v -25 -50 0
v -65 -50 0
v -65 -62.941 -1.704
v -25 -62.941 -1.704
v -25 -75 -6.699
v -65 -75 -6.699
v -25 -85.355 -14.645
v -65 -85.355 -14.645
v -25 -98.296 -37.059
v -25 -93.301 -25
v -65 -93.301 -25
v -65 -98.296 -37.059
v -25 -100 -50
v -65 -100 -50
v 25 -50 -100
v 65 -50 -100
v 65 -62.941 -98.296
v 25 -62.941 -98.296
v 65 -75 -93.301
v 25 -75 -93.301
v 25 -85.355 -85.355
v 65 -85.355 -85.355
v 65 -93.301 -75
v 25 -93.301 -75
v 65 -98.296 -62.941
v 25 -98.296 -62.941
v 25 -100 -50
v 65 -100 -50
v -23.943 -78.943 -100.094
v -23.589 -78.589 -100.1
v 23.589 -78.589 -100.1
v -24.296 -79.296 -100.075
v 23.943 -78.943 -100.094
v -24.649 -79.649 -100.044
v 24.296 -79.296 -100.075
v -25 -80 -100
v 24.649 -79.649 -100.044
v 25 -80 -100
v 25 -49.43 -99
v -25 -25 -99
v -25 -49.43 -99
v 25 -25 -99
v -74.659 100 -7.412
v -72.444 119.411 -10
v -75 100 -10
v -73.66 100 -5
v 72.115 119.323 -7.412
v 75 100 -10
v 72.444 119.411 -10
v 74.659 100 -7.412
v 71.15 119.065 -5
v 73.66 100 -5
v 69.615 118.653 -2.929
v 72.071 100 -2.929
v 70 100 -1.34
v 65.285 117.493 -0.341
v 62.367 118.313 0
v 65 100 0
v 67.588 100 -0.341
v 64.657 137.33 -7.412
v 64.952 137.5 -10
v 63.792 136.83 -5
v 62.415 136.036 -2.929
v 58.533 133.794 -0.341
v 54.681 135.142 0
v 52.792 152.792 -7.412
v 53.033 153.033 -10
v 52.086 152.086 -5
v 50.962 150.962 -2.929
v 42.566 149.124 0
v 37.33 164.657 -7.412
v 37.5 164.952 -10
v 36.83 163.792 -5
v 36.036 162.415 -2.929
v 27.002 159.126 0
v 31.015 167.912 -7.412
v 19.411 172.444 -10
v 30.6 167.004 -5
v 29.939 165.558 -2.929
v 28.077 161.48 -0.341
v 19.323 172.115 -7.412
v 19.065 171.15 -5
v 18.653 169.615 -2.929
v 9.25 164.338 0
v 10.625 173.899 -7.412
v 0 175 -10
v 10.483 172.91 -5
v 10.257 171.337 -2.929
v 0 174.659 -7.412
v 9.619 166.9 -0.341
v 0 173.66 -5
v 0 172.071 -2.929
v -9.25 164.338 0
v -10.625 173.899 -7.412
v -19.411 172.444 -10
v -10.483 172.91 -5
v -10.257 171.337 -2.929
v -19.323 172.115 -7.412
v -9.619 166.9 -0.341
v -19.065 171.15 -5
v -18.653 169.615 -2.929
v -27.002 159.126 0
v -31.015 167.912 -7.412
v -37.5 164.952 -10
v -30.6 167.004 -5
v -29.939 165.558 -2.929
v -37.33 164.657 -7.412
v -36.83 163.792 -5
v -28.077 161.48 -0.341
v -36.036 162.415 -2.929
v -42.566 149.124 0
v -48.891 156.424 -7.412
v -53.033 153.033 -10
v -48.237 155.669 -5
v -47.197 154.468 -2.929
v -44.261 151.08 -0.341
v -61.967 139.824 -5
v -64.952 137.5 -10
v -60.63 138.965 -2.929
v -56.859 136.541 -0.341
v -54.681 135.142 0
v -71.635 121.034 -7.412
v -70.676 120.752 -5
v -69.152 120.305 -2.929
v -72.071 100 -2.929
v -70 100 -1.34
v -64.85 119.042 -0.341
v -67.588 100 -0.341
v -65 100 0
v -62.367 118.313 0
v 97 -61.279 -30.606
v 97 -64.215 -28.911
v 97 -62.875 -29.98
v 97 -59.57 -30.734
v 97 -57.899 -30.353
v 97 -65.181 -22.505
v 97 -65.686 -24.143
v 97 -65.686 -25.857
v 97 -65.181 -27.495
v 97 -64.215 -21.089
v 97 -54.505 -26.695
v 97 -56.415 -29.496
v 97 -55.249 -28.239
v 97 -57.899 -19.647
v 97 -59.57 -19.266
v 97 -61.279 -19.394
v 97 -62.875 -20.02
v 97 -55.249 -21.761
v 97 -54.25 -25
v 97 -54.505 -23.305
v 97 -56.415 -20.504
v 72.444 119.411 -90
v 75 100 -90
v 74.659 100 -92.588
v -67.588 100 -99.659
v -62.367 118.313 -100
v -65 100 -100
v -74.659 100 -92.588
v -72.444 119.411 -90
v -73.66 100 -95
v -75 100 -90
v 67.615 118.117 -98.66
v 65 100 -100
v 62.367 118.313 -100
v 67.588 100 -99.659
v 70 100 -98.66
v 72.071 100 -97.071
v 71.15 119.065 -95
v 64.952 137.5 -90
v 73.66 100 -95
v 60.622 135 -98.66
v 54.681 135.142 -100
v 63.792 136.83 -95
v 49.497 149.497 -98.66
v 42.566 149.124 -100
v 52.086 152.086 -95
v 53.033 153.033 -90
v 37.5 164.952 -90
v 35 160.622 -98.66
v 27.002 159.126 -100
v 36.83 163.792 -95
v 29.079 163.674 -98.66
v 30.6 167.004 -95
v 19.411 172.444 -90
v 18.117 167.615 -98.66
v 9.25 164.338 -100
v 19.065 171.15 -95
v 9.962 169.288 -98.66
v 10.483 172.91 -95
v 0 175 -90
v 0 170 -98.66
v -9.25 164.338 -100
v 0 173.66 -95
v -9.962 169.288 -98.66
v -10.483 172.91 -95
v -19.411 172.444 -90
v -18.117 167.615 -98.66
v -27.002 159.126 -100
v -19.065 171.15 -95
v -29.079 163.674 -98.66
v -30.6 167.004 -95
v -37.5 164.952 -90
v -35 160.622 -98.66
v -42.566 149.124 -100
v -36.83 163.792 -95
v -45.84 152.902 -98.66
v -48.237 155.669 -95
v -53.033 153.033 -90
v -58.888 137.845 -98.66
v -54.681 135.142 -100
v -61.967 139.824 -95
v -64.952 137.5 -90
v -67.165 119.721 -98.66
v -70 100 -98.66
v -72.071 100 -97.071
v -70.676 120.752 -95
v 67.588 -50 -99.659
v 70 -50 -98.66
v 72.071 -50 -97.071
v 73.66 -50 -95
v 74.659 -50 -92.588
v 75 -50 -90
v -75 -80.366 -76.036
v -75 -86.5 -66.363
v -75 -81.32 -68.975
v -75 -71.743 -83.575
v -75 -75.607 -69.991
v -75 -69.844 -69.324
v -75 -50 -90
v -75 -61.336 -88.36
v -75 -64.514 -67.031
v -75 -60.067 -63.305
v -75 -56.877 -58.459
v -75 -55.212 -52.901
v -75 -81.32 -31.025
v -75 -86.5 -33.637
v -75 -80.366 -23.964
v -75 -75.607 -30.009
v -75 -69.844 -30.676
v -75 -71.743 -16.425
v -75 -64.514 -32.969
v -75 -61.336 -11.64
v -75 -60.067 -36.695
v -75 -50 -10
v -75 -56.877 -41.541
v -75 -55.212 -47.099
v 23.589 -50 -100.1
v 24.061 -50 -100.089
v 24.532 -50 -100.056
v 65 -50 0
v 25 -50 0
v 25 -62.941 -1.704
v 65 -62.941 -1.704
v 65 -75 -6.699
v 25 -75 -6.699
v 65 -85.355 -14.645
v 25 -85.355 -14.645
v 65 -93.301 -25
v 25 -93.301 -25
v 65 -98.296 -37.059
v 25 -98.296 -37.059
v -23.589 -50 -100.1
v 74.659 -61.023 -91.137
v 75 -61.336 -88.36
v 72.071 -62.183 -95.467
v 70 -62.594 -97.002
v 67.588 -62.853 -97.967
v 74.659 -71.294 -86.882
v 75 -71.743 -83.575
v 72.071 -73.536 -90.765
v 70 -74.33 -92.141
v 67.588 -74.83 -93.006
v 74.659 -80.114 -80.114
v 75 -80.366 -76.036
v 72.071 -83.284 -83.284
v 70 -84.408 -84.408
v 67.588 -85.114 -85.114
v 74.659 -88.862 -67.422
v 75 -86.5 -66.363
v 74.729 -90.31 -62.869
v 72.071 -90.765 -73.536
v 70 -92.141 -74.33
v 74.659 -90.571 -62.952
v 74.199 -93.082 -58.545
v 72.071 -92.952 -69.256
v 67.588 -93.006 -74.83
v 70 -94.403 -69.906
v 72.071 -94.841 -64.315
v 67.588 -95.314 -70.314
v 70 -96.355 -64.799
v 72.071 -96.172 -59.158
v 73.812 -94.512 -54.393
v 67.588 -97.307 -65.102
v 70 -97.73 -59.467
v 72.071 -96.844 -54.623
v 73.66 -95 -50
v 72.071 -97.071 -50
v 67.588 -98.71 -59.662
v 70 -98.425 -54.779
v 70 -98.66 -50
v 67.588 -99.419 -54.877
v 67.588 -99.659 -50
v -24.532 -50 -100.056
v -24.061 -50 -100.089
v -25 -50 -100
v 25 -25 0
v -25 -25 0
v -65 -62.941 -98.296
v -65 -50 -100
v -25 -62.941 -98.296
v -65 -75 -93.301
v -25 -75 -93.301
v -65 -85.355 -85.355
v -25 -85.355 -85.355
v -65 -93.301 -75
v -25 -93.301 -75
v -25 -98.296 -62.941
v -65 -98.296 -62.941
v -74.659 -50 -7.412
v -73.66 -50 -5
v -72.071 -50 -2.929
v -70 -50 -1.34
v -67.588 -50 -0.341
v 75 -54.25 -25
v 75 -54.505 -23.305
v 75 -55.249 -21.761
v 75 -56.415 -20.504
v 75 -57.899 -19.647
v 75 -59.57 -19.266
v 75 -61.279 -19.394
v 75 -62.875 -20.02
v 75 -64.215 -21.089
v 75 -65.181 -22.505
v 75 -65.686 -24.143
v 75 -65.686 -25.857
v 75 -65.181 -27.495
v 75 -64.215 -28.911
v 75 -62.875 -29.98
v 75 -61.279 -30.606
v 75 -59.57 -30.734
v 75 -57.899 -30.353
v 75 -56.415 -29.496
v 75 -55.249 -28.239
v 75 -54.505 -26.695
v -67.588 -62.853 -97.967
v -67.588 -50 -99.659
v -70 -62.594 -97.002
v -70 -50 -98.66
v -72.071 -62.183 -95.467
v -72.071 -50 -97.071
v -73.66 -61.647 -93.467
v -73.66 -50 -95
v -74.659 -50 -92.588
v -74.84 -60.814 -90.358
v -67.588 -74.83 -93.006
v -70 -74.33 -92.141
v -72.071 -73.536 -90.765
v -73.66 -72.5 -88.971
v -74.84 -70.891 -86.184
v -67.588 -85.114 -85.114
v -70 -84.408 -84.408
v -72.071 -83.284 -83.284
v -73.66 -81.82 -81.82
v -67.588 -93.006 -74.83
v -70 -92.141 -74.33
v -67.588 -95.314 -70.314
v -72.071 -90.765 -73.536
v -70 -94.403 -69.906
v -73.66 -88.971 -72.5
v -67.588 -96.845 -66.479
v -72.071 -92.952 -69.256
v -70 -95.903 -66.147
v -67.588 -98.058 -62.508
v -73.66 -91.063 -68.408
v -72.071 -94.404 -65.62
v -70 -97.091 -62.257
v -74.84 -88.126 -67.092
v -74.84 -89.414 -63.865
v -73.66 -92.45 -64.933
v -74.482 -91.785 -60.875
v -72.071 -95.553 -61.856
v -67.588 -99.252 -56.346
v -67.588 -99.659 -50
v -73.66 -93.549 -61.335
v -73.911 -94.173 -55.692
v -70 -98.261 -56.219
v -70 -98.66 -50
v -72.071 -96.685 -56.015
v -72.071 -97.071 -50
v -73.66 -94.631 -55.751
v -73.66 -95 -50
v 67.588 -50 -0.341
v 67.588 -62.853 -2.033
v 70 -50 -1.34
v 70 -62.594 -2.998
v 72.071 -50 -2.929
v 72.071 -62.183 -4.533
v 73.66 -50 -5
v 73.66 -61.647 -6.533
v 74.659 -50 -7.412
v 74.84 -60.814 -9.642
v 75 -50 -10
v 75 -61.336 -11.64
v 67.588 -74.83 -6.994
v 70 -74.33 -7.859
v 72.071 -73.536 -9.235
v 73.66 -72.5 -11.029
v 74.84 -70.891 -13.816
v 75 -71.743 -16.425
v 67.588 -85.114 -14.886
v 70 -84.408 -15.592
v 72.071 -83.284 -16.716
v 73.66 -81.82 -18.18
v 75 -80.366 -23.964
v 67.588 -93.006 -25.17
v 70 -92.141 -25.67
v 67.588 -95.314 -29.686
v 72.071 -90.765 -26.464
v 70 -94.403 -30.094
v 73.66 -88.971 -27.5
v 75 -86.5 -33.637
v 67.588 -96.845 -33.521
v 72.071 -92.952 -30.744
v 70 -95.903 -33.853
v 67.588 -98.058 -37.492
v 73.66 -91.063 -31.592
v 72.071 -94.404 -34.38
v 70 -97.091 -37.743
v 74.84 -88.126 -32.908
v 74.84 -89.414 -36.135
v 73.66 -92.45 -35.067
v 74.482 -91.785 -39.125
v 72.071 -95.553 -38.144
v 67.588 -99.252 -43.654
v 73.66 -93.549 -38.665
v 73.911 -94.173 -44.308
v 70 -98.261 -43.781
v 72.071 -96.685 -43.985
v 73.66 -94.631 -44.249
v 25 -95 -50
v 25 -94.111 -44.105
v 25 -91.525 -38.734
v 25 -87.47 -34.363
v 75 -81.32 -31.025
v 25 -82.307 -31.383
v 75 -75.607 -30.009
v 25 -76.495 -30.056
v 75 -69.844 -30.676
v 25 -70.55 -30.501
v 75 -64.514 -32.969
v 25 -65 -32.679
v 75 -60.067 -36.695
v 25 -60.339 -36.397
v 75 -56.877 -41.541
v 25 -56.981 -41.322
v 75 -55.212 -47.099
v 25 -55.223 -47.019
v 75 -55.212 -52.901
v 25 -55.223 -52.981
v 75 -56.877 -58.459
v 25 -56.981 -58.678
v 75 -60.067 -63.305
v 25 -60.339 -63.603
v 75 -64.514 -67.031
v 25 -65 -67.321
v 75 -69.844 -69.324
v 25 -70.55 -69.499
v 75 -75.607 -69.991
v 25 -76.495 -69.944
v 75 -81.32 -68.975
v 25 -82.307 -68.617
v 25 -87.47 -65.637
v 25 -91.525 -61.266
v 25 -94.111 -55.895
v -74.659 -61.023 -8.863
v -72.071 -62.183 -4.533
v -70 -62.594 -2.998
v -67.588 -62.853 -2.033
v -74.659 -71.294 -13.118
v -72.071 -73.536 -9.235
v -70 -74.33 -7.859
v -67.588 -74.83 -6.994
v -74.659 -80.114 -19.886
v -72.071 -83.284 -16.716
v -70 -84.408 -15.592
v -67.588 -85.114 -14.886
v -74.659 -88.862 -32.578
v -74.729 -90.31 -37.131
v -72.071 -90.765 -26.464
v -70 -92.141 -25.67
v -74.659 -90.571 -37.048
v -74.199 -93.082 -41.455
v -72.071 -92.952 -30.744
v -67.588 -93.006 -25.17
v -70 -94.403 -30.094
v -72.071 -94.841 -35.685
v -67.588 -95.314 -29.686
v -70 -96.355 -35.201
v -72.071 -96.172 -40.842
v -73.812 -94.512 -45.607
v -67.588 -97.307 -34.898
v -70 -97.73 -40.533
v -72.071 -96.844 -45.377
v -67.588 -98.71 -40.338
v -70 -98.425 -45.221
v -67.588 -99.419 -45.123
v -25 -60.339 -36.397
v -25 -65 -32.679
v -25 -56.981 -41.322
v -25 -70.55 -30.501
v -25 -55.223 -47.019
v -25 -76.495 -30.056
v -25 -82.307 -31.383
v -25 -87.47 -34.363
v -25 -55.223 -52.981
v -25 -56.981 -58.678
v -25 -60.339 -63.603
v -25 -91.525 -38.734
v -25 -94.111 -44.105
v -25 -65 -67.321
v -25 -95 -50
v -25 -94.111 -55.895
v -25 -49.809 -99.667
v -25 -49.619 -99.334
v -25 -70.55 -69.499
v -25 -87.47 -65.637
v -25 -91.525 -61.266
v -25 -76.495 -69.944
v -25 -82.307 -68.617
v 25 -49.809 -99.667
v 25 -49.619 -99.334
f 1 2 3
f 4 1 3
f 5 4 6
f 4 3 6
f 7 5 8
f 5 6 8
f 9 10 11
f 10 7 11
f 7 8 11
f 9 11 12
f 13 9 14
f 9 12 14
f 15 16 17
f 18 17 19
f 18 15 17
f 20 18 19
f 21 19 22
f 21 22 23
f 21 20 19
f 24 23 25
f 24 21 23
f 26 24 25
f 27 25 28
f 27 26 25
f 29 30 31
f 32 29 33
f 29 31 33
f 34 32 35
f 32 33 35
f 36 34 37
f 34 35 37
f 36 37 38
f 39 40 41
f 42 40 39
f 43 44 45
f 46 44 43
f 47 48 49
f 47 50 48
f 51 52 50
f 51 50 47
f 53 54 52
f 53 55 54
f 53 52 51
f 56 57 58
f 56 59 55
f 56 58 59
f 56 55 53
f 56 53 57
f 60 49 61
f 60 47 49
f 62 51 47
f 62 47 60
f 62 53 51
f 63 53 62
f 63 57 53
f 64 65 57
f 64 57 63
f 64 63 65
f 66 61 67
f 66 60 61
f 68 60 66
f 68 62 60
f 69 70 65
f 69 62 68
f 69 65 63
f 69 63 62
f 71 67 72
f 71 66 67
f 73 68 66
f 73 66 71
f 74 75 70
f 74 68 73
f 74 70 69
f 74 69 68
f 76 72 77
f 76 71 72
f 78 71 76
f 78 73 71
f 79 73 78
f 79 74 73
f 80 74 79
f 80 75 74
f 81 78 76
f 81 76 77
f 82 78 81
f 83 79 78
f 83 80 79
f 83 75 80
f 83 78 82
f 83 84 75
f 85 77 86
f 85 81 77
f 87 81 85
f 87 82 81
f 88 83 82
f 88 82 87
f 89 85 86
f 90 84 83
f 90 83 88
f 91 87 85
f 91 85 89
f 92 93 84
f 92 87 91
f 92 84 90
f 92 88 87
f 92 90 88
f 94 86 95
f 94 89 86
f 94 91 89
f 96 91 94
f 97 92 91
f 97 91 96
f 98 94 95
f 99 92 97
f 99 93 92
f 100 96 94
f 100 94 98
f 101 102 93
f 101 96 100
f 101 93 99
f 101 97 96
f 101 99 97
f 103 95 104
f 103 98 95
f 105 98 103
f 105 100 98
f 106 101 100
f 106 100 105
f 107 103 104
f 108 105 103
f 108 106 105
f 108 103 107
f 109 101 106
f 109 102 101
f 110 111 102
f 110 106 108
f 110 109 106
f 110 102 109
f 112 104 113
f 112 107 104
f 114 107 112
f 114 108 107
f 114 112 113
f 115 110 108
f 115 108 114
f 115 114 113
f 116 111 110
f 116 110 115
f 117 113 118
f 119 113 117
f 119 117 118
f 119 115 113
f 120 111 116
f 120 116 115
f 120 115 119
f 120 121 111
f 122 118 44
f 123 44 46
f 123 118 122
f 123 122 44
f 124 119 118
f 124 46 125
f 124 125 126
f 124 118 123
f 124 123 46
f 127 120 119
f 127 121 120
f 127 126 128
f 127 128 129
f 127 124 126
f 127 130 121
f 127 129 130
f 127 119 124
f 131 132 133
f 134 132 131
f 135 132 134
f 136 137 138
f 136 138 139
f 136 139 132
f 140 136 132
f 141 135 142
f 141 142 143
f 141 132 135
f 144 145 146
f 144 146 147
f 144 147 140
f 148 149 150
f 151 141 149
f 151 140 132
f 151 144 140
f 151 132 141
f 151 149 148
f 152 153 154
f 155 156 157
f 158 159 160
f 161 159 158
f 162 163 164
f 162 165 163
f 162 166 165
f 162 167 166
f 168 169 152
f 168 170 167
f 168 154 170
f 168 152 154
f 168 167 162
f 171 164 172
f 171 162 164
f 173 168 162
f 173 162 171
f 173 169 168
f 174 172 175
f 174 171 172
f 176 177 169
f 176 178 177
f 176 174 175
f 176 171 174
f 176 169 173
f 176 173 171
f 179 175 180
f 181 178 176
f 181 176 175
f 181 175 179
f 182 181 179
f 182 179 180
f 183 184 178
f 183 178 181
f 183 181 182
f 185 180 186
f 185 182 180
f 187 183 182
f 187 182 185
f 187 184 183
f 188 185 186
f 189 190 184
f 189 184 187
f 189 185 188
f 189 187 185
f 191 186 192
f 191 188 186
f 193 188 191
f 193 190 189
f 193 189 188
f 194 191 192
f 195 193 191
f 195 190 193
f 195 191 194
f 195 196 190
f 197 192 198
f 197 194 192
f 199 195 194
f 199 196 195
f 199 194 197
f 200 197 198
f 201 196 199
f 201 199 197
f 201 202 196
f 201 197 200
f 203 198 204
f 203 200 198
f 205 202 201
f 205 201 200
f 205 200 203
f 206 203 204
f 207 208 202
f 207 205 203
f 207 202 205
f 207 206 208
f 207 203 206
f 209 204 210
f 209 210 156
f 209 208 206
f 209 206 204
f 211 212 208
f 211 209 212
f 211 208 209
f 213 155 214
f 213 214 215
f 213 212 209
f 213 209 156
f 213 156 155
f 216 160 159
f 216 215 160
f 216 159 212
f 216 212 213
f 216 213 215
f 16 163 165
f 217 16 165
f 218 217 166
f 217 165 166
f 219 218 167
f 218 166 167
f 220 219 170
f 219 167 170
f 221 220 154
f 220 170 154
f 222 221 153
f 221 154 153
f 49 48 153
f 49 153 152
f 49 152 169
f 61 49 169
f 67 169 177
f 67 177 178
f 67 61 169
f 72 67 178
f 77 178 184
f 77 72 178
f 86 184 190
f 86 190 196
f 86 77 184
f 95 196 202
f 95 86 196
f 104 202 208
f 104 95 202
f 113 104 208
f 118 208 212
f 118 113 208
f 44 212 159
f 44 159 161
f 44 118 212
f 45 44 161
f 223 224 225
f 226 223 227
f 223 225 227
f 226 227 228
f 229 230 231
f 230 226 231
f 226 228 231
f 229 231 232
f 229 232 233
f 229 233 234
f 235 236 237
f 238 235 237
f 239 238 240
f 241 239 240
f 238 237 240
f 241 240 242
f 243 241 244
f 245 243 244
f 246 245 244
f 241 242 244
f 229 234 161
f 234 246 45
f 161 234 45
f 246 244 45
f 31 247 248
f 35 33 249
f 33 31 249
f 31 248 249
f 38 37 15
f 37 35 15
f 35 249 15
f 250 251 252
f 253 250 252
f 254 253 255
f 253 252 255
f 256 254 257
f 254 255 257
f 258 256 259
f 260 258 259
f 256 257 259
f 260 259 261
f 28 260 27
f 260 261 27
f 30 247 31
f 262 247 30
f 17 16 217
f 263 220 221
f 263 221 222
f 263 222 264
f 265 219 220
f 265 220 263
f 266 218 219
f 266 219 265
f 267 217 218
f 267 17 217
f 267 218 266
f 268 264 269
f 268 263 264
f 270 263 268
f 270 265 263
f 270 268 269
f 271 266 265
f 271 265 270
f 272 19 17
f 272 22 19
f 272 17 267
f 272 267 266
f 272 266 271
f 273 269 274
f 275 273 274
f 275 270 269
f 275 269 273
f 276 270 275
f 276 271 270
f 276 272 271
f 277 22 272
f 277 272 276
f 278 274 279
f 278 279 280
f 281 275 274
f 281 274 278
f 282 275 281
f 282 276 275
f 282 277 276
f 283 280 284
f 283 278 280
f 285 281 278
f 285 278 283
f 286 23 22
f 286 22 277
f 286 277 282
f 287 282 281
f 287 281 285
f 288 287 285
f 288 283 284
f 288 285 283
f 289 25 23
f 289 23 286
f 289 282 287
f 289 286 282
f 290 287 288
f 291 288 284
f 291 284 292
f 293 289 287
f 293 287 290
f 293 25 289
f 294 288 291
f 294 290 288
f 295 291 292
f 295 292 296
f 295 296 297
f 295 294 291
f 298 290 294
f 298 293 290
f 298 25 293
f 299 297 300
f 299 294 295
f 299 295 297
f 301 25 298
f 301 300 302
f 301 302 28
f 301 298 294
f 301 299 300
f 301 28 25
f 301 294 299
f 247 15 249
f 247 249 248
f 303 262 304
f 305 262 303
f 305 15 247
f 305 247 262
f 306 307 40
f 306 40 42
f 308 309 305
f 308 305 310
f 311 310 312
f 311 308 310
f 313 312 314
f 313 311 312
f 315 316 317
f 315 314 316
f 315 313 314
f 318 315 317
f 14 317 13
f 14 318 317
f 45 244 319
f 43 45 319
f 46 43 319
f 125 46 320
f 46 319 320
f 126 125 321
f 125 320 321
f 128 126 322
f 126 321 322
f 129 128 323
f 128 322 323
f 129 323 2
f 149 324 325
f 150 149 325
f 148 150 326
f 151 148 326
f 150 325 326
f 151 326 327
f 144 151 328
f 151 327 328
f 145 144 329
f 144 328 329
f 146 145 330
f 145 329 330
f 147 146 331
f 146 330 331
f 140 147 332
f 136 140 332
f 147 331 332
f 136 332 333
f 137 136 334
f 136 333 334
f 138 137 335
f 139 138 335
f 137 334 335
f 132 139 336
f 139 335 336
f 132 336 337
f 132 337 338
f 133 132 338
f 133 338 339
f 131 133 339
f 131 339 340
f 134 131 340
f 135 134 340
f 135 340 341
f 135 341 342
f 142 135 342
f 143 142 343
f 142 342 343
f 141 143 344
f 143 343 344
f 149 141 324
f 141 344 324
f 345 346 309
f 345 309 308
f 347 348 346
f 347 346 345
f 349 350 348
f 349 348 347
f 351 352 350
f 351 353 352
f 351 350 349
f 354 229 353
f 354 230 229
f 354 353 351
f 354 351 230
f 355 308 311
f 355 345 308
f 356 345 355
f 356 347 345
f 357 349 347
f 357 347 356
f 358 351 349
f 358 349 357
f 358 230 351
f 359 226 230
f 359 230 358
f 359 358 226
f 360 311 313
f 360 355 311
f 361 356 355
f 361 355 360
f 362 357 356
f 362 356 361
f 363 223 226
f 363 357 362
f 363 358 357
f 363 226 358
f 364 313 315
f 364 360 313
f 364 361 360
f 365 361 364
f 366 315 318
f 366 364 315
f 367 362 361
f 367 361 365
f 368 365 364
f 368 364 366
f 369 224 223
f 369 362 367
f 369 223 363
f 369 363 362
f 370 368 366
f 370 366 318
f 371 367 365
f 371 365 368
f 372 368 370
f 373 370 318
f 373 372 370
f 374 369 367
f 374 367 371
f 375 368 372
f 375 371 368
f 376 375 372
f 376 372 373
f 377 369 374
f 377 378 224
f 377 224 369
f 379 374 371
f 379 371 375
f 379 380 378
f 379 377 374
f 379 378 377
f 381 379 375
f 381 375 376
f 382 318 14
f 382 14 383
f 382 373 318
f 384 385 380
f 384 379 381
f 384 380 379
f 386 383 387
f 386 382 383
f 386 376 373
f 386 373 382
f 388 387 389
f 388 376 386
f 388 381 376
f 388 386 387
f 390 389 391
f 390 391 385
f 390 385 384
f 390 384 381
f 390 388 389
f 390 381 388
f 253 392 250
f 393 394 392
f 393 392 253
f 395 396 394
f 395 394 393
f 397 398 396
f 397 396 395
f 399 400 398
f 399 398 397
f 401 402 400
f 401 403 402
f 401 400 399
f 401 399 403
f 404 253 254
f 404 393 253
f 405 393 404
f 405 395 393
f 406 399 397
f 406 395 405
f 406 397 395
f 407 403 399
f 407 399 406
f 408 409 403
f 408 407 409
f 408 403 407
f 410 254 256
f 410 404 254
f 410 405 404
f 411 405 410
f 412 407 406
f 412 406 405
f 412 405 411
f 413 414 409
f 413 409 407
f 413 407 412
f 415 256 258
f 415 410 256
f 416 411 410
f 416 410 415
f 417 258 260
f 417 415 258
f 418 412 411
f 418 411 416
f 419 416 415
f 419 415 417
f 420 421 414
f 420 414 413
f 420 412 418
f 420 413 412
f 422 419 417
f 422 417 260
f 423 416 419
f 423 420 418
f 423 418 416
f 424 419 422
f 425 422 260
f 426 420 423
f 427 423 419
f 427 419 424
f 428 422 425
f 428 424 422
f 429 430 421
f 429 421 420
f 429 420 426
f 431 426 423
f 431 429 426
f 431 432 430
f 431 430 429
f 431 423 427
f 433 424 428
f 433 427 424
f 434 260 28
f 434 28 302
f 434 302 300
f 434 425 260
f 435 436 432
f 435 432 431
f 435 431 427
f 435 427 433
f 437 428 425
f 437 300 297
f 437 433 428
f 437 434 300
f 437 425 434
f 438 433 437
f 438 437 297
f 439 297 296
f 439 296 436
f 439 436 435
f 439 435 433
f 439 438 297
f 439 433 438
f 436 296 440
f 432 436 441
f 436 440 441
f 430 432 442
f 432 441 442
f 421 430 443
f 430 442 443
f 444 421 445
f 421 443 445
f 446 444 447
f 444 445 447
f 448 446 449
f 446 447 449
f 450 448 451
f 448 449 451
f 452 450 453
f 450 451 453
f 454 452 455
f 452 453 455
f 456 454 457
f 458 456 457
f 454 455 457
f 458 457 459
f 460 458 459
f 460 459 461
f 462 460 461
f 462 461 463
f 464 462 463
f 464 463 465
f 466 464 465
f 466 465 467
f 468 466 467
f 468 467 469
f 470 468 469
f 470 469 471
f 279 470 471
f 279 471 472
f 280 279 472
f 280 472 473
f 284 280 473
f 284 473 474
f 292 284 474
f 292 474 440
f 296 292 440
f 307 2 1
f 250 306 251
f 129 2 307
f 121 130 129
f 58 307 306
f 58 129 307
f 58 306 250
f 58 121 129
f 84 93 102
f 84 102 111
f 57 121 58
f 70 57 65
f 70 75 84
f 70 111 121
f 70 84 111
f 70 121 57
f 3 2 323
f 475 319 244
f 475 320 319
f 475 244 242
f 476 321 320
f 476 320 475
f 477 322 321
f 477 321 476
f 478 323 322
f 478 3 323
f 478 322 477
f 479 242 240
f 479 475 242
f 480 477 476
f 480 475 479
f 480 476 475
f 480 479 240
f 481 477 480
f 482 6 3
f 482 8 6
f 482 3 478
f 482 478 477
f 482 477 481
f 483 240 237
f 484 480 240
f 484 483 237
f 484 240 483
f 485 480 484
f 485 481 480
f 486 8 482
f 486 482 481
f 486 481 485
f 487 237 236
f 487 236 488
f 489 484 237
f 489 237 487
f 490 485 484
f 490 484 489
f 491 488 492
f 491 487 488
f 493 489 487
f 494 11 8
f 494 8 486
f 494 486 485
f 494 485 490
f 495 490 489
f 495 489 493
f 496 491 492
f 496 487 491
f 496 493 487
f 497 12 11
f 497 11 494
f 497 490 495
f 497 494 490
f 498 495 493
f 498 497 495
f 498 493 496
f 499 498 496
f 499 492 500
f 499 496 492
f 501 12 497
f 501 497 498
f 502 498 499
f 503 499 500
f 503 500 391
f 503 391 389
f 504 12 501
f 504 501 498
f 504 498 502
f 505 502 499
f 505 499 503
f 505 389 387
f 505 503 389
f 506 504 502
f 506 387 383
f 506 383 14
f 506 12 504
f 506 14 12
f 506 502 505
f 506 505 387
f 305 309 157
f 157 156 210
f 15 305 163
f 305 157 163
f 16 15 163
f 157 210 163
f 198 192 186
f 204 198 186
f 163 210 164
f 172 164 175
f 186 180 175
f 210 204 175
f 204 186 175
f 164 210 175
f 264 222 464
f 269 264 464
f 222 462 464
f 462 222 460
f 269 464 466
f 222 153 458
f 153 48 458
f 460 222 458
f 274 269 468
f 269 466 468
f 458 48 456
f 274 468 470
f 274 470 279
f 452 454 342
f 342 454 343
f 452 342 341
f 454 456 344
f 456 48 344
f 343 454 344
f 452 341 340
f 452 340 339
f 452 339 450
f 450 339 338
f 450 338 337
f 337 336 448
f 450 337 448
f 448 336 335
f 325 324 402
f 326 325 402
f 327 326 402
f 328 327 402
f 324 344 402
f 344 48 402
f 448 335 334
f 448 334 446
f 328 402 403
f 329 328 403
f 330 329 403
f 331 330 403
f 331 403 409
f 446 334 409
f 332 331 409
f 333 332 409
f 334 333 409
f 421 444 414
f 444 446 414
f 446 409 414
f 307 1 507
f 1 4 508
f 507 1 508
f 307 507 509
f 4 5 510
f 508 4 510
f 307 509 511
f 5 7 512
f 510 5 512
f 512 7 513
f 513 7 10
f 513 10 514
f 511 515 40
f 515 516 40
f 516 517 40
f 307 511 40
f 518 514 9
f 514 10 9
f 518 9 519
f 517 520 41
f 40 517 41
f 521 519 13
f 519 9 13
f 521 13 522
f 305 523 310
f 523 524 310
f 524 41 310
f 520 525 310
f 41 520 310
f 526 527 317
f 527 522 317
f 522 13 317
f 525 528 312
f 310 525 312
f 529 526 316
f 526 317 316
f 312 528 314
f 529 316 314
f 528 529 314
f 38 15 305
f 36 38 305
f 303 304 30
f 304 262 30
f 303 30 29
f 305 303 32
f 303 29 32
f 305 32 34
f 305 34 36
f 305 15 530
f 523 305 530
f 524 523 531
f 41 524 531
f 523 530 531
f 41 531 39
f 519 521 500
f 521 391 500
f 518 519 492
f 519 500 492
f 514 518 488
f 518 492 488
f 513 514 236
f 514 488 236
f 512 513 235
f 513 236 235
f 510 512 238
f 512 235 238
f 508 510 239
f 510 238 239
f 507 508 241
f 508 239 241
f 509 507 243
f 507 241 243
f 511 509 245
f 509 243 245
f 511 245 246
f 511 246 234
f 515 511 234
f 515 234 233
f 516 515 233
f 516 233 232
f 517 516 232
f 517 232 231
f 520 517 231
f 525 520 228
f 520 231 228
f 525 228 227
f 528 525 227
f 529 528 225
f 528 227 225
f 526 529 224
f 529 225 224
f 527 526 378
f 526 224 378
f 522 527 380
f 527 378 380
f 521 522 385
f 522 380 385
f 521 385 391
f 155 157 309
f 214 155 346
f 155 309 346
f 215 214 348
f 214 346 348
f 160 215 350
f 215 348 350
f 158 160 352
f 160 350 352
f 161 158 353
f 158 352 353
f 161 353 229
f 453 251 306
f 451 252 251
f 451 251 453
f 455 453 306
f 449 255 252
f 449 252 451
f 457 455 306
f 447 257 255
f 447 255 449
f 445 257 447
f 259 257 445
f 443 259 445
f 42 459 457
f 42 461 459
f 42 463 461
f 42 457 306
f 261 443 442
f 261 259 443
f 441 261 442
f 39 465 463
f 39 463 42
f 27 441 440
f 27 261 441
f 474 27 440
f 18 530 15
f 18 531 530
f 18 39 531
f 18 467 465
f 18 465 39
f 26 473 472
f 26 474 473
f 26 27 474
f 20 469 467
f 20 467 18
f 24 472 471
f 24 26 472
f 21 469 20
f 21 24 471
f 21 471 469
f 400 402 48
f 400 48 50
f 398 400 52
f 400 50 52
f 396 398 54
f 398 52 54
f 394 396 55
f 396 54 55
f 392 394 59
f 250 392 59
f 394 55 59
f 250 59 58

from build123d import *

# Parameters (mm, degrees)
BOSS_EXTRUDE1_DEPTH    = 100
SKETCH2_W              = 50
SKETCH2_H              = 50
CUT_EXTRUDE1_DEPTH     = 161.078105936
CUT_EXTRUDE2_DEPTH     = 25
SKETCH7_R              = 20
CUT_EXTRUDE3_DEPTH     = 207.155281281
FILLET2_R              = 50
CUT_EXTRUDE6_START     = -100
CUT_EXTRUDE6_OUTLINE_W = 50
CUT_EXTRUDE6_OUTLINE_H = 6.698729811
CUT_EXTRUDE6_DEPTH     = 50
CUT_EXTRUDE7_DEPTH     = 25
BOSS_EXTRUDE2_DEPTH    = 100
FILLET4_R              = 10
SKETCH11_W             = 50
SKETCH11_H             = 25
CUT_EXTRUDE11_DEPTH    = 99
SKETCH16_W             = 50
SKETCH16_H             = 30
BOSS_EXTRUDE3_DEPTH    = 0.1
FILLET5_R              = 10
SKETCH17_R             = 5.75
BOSS_EXTRUDE4_DEPTH    = 22


with BuildPart() as part:
    # Sketch1 → Boss-Extrude1 (new body)
    with BuildSketch(Plane.XY):
        Polygon((-75, 100), (0.2, 100), (49.8, 100), (75, 100), (75, -100), (-75, -100), align=None)
    extrude(amount=-BOSS_EXTRUDE1_DEPTH)

    # Sketch2 → Cut-Extrude1 (cut, through all)
    with BuildSketch(Plane.XY):
        with Locations((0, -100)):
            Rectangle(SKETCH2_W, SKETCH2_H)
    extrude(amount=-CUT_EXTRUDE1_DEPTH, mode=Mode.SUBTRACT)

    # Sketch6 → Cut-Extrude2 (cut, symmetric)
    with BuildSketch(Plane(origin=(0, 0, 0), x_dir=(0, 0, -1), z_dir=(1, 0, 0))):
        with BuildLine():
            Line((100, -75), (0, -75))
            ThreePointArc((0, -75), (50, -25), (100, -75))
        make_face()
    extrude(amount=CUT_EXTRUDE2_DEPTH, both=True, mode=Mode.SUBTRACT)

    # Sketch7 → Cut-Extrude3 (cut, through all)
    with BuildSketch(Plane.ZY.offset(75)):
        with Locations(Location((-50, -75, 0), (0, 0, 270))):
            Circle(SKETCH7_R)
    extrude(amount=-CUT_EXTRUDE3_DEPTH, mode=Mode.SUBTRACT)

    # Fillet2
    fillet2_edges = [part.edges().sort_by_distance(p)[0] for p in [
        (-50, -100, -100),
        (-50, -100, 0),
    ]]
    fillet(fillet2_edges, radius=FILLET2_R - 0.0001)  # a hair under: the kernel refuses the full size

    # Cut-Extrude6: read off the stored shape, not the designer's step
    # Cut-Extrude6 outline → Cut-Extrude6 (cut)
    with BuildSketch(Plane(origin=(0, 0, 0), x_dir=(1, 0, 0), z_dir=(0, 1, 0)).offset(CUT_EXTRUDE6_START)):
        with Locations((0, 96.650635095)):
            Rectangle(CUT_EXTRUDE6_OUTLINE_W, CUT_EXTRUDE6_OUTLINE_H)
        with Locations((0, 3.349364906)):
            Rectangle(CUT_EXTRUDE6_OUTLINE_W, CUT_EXTRUDE6_OUTLINE_H)
    extrude(amount=CUT_EXTRUDE6_DEPTH, mode=Mode.SUBTRACT)

    # Sketch10 → Cut-Extrude7 (cut, symmetric)
    with BuildSketch(Plane(origin=(0, 0, 0), x_dir=(0, 0, -1), z_dir=(1, 0, 0))):
        with BuildLine():
            Line((0, -50), (100, -50))
            ThreePointArc((100, -50), (50, -36.602540378), (0, -50))
        make_face()
    extrude(amount=CUT_EXTRUDE7_DEPTH, both=True, mode=Mode.SUBTRACT)

    # Sketch15 → Boss-Extrude2 (add)
    with BuildSketch(Plane.XY):
        with BuildLine():
            Line((-75, 100), (75, 100))
            ThreePointArc((75, 100), (0, 175), (-75, 100))
        make_face()
    extrude(amount=-BOSS_EXTRUDE2_DEPTH)

    # Fillet4
    # the kernel refuses this fillet: 10 mm, written as the material it takes off along each edge
    with BuildSketch(Plane(origin=(0, 100, -100), x_dir=(1, 0, 0), z_dir=(0, -1, 0))) as fillet4_piece_1:
        with BuildLine():
            CenterArc((75 - FILLET4_R, FILLET4_R), FILLET4_R, 270, 90)
            Line((75, FILLET4_R), (75, 0))
            Line((75, 0), (75 - FILLET4_R, 0))
        make_face()
    revolve(axis=Axis((0, 100, -100), (0, 0, 1)), revolution_arc=180, mode=Mode.SUBTRACT)
    with BuildSketch(Plane(origin=(0, 100, 0), x_dir=(1, 0, 0), z_dir=(0, -1, 0))) as fillet4_piece_2:
        with BuildLine():
            CenterArc((75 - FILLET4_R, -FILLET4_R), FILLET4_R, 0, 90)
            Line((75, -FILLET4_R), (75, 0))
            Line((75, 0), (75 - FILLET4_R, 0))
        make_face()
    revolve(axis=Axis((0, 100, 0), (0, 0, 1)), revolution_arc=180, mode=Mode.SUBTRACT)
    with BuildSketch(Plane(origin=(-75, -50.0001, -100), x_dir=(0, 0, 1), z_dir=(0, 1, 0)), Plane(origin=(75, 100, 0), x_dir=(-1, 0, 0), z_dir=(0, -1, 0))) as fillet4_piece_3:
        with BuildLine():
            CenterArc((FILLET4_R, FILLET4_R), FILLET4_R, 180, 90)
            Line((0, FILLET4_R), (0, 0))
            Line((0, 0), (FILLET4_R, 0))
        make_face()
    extrude(amount=150.0001, mode=Mode.SUBTRACT)
    with BuildSketch(Plane(origin=(75, 100, -100), x_dir=(-1, 0, 0), z_dir=(0, -1, 0)), Plane(origin=(-75, -50.0001, 0), x_dir=(0, 0, -1), z_dir=(0, 1, 0))) as fillet4_piece_4:
        with BuildLine():
            CenterArc((FILLET4_R, -FILLET4_R), FILLET4_R, 90, 90)
            Line((0, -FILLET4_R), (0, 0))
            Line((0, 0), (FILLET4_R, 0))
        make_face()
    extrude(amount=150.0001, mode=Mode.SUBTRACT)
    with BuildSketch(Plane(origin=(75, -50.0001, -49.9999), x_dir=(0, 0, 1), z_dir=(0, 1, 0))) as fillet4_piece_5:
        with BuildLine():
            CenterArc((49.9999 - FILLET4_R, -FILLET4_R), FILLET4_R, 0, 90)
            Line((49.9999 - FILLET4_R, 0), (49.9999, 0))
            Line((49.9999, 0), (49.9999, -FILLET4_R))
        make_face()
    revolve(axis=Axis((75, -50.0001, -49.9999), (1, 0, 0)), revolution_arc=90, mode=Mode.SUBTRACT)
    with BuildSketch(Plane(origin=(75, -50.0001, -50.0001), x_dir=(0, 0, -1), z_dir=(0, 1, 0))) as fillet4_piece_6:
        with BuildLine():
            CenterArc((49.9999 - FILLET4_R, FILLET4_R), FILLET4_R, 270, 90)
            Line((49.9999, FILLET4_R), (49.9999, 0))
            Line((49.9999, 0), (49.9999 - FILLET4_R, 0))
        make_face()
    revolve(axis=Axis((75, -50.0001, -50.0001), (-1, 0, 0)), revolution_arc=90, mode=Mode.SUBTRACT)
    with BuildSketch(Plane(origin=(-75, -50.0001, -49.9999), x_dir=(0, 0, 1), z_dir=(0, 1, 0))) as fillet4_piece_7:
        with BuildLine():
            CenterArc((49.9999 - FILLET4_R, FILLET4_R), FILLET4_R, 270, 90)
            Line((49.9999, FILLET4_R), (49.9999, 0))
            Line((49.9999, 0), (49.9999 - FILLET4_R, 0))
        make_face()
    revolve(axis=Axis((-75, -50.0001, -49.9999), (1, 0, 0)), revolution_arc=90, mode=Mode.SUBTRACT)
    with BuildSketch(Plane(origin=(-75, -50.0001, -50.0001), x_dir=(0, 0, -1), z_dir=(0, 1, 0))) as fillet4_piece_8:
        with BuildLine():
            CenterArc((49.9999 - FILLET4_R, -FILLET4_R), FILLET4_R, 0, 90)
            Line((49.9999, -FILLET4_R), (49.9999, 0))
            Line((49.9999, 0), (49.9999 - FILLET4_R, 0))
        make_face()
    revolve(axis=Axis((-75, -50.0001, -50.0001), (-1, 0, 0)), revolution_arc=90, mode=Mode.SUBTRACT)
    with BuildSketch(Plane(origin=(-75, -100, -49.9999), x_dir=(0, 1, 0), z_dir=(0, 0, -1))) as fillet4_piece_9:
        with BuildLine():
            CenterArc((FILLET4_R, FILLET4_R), FILLET4_R, 180, 90)
            Line((0, FILLET4_R), (0, 0))
            Line((0, 0), (FILLET4_R, 0))
        make_face()
    extrude(amount=0.0002, mode=Mode.SUBTRACT)
    with BuildSketch(Plane(origin=(75, -100, -49.9999), x_dir=(0, 1, 0), z_dir=(0, 0, -1))) as fillet4_piece_10:
        with BuildLine():
            CenterArc((FILLET4_R, -FILLET4_R), FILLET4_R, 90, 90)
            Line((0, -FILLET4_R), (0, 0))
            Line((0, 0), (FILLET4_R, 0))
        make_face()
    extrude(amount=0.0002, mode=Mode.SUBTRACT)

    # Sketch11 → Cut-Extrude11 (cut)
    with BuildSketch(Plane.XY):
        with Locations((0, -37.5)):
            Rectangle(SKETCH11_W, SKETCH11_H)
    extrude(amount=-CUT_EXTRUDE11_DEPTH, mode=Mode.SUBTRACT)

    # Sketch17 → Boss-Extrude4 (add)
    with BuildSketch(Plane(origin=(75, 0, 0), x_dir=(0, 0, -1), z_dir=(1, 0, 0))):
        with Locations(Location((25, -60, 0), (0, 0, 90))):
            Circle(SKETCH17_R)
    extrude(amount=BOSS_EXTRUDE4_DEPTH)


with BuildPart() as body_2:
    # Sketch16 → Boss-Extrude3 (new body)
    with BuildSketch(Plane(origin=(0, 0, -100), x_dir=(-1, 0, 0), z_dir=(0, 0, -1))):
        with Locations((0, -65)):
            Rectangle(SKETCH16_W, SKETCH16_H)
    extrude(amount=BOSS_EXTRUDE3_DEPTH)

    # Fillet5
    # the kernel refuses this fillet: 10 mm, written as the material it takes off along each edge
    with BuildSketch(Plane(origin=(25, -46.473316005, -100.1), x_dir=(0, 0, 1), z_dir=(0, -1, 0)), Plane(origin=(-25, -83.526683995, -100.1), x_dir=(0, 0, 1), z_dir=(0, 1, 0))) as fillet5_piece_1:
        with BuildLine():
            CenterArc((10, 1.410673598), FILLET5_R, 180, 8.109614456)
            Line((0, 1.410673598), (0, 0))
            Line((0, 0), (0.1, 0))
        make_face()
    extrude(amount=37.05336799, mode=Mode.SUBTRACT)
    with BuildSketch(Plane(origin=(28.526683995, -80, -100.1), x_dir=(0, 0, 1), z_dir=(-1, 0, 0))) as fillet5_piece_2:
        with BuildLine():
            CenterArc((10, 1.410673598), FILLET5_R, 180, 8.109614456)
            Line((0, 1.410673598), (0, 0))
            Line((0, 0), (0.1, 0))
        make_face()
    extrude(amount=57.05336799, mode=Mode.SUBTRACT)


solid = Compound([part.part, body_2.part])
